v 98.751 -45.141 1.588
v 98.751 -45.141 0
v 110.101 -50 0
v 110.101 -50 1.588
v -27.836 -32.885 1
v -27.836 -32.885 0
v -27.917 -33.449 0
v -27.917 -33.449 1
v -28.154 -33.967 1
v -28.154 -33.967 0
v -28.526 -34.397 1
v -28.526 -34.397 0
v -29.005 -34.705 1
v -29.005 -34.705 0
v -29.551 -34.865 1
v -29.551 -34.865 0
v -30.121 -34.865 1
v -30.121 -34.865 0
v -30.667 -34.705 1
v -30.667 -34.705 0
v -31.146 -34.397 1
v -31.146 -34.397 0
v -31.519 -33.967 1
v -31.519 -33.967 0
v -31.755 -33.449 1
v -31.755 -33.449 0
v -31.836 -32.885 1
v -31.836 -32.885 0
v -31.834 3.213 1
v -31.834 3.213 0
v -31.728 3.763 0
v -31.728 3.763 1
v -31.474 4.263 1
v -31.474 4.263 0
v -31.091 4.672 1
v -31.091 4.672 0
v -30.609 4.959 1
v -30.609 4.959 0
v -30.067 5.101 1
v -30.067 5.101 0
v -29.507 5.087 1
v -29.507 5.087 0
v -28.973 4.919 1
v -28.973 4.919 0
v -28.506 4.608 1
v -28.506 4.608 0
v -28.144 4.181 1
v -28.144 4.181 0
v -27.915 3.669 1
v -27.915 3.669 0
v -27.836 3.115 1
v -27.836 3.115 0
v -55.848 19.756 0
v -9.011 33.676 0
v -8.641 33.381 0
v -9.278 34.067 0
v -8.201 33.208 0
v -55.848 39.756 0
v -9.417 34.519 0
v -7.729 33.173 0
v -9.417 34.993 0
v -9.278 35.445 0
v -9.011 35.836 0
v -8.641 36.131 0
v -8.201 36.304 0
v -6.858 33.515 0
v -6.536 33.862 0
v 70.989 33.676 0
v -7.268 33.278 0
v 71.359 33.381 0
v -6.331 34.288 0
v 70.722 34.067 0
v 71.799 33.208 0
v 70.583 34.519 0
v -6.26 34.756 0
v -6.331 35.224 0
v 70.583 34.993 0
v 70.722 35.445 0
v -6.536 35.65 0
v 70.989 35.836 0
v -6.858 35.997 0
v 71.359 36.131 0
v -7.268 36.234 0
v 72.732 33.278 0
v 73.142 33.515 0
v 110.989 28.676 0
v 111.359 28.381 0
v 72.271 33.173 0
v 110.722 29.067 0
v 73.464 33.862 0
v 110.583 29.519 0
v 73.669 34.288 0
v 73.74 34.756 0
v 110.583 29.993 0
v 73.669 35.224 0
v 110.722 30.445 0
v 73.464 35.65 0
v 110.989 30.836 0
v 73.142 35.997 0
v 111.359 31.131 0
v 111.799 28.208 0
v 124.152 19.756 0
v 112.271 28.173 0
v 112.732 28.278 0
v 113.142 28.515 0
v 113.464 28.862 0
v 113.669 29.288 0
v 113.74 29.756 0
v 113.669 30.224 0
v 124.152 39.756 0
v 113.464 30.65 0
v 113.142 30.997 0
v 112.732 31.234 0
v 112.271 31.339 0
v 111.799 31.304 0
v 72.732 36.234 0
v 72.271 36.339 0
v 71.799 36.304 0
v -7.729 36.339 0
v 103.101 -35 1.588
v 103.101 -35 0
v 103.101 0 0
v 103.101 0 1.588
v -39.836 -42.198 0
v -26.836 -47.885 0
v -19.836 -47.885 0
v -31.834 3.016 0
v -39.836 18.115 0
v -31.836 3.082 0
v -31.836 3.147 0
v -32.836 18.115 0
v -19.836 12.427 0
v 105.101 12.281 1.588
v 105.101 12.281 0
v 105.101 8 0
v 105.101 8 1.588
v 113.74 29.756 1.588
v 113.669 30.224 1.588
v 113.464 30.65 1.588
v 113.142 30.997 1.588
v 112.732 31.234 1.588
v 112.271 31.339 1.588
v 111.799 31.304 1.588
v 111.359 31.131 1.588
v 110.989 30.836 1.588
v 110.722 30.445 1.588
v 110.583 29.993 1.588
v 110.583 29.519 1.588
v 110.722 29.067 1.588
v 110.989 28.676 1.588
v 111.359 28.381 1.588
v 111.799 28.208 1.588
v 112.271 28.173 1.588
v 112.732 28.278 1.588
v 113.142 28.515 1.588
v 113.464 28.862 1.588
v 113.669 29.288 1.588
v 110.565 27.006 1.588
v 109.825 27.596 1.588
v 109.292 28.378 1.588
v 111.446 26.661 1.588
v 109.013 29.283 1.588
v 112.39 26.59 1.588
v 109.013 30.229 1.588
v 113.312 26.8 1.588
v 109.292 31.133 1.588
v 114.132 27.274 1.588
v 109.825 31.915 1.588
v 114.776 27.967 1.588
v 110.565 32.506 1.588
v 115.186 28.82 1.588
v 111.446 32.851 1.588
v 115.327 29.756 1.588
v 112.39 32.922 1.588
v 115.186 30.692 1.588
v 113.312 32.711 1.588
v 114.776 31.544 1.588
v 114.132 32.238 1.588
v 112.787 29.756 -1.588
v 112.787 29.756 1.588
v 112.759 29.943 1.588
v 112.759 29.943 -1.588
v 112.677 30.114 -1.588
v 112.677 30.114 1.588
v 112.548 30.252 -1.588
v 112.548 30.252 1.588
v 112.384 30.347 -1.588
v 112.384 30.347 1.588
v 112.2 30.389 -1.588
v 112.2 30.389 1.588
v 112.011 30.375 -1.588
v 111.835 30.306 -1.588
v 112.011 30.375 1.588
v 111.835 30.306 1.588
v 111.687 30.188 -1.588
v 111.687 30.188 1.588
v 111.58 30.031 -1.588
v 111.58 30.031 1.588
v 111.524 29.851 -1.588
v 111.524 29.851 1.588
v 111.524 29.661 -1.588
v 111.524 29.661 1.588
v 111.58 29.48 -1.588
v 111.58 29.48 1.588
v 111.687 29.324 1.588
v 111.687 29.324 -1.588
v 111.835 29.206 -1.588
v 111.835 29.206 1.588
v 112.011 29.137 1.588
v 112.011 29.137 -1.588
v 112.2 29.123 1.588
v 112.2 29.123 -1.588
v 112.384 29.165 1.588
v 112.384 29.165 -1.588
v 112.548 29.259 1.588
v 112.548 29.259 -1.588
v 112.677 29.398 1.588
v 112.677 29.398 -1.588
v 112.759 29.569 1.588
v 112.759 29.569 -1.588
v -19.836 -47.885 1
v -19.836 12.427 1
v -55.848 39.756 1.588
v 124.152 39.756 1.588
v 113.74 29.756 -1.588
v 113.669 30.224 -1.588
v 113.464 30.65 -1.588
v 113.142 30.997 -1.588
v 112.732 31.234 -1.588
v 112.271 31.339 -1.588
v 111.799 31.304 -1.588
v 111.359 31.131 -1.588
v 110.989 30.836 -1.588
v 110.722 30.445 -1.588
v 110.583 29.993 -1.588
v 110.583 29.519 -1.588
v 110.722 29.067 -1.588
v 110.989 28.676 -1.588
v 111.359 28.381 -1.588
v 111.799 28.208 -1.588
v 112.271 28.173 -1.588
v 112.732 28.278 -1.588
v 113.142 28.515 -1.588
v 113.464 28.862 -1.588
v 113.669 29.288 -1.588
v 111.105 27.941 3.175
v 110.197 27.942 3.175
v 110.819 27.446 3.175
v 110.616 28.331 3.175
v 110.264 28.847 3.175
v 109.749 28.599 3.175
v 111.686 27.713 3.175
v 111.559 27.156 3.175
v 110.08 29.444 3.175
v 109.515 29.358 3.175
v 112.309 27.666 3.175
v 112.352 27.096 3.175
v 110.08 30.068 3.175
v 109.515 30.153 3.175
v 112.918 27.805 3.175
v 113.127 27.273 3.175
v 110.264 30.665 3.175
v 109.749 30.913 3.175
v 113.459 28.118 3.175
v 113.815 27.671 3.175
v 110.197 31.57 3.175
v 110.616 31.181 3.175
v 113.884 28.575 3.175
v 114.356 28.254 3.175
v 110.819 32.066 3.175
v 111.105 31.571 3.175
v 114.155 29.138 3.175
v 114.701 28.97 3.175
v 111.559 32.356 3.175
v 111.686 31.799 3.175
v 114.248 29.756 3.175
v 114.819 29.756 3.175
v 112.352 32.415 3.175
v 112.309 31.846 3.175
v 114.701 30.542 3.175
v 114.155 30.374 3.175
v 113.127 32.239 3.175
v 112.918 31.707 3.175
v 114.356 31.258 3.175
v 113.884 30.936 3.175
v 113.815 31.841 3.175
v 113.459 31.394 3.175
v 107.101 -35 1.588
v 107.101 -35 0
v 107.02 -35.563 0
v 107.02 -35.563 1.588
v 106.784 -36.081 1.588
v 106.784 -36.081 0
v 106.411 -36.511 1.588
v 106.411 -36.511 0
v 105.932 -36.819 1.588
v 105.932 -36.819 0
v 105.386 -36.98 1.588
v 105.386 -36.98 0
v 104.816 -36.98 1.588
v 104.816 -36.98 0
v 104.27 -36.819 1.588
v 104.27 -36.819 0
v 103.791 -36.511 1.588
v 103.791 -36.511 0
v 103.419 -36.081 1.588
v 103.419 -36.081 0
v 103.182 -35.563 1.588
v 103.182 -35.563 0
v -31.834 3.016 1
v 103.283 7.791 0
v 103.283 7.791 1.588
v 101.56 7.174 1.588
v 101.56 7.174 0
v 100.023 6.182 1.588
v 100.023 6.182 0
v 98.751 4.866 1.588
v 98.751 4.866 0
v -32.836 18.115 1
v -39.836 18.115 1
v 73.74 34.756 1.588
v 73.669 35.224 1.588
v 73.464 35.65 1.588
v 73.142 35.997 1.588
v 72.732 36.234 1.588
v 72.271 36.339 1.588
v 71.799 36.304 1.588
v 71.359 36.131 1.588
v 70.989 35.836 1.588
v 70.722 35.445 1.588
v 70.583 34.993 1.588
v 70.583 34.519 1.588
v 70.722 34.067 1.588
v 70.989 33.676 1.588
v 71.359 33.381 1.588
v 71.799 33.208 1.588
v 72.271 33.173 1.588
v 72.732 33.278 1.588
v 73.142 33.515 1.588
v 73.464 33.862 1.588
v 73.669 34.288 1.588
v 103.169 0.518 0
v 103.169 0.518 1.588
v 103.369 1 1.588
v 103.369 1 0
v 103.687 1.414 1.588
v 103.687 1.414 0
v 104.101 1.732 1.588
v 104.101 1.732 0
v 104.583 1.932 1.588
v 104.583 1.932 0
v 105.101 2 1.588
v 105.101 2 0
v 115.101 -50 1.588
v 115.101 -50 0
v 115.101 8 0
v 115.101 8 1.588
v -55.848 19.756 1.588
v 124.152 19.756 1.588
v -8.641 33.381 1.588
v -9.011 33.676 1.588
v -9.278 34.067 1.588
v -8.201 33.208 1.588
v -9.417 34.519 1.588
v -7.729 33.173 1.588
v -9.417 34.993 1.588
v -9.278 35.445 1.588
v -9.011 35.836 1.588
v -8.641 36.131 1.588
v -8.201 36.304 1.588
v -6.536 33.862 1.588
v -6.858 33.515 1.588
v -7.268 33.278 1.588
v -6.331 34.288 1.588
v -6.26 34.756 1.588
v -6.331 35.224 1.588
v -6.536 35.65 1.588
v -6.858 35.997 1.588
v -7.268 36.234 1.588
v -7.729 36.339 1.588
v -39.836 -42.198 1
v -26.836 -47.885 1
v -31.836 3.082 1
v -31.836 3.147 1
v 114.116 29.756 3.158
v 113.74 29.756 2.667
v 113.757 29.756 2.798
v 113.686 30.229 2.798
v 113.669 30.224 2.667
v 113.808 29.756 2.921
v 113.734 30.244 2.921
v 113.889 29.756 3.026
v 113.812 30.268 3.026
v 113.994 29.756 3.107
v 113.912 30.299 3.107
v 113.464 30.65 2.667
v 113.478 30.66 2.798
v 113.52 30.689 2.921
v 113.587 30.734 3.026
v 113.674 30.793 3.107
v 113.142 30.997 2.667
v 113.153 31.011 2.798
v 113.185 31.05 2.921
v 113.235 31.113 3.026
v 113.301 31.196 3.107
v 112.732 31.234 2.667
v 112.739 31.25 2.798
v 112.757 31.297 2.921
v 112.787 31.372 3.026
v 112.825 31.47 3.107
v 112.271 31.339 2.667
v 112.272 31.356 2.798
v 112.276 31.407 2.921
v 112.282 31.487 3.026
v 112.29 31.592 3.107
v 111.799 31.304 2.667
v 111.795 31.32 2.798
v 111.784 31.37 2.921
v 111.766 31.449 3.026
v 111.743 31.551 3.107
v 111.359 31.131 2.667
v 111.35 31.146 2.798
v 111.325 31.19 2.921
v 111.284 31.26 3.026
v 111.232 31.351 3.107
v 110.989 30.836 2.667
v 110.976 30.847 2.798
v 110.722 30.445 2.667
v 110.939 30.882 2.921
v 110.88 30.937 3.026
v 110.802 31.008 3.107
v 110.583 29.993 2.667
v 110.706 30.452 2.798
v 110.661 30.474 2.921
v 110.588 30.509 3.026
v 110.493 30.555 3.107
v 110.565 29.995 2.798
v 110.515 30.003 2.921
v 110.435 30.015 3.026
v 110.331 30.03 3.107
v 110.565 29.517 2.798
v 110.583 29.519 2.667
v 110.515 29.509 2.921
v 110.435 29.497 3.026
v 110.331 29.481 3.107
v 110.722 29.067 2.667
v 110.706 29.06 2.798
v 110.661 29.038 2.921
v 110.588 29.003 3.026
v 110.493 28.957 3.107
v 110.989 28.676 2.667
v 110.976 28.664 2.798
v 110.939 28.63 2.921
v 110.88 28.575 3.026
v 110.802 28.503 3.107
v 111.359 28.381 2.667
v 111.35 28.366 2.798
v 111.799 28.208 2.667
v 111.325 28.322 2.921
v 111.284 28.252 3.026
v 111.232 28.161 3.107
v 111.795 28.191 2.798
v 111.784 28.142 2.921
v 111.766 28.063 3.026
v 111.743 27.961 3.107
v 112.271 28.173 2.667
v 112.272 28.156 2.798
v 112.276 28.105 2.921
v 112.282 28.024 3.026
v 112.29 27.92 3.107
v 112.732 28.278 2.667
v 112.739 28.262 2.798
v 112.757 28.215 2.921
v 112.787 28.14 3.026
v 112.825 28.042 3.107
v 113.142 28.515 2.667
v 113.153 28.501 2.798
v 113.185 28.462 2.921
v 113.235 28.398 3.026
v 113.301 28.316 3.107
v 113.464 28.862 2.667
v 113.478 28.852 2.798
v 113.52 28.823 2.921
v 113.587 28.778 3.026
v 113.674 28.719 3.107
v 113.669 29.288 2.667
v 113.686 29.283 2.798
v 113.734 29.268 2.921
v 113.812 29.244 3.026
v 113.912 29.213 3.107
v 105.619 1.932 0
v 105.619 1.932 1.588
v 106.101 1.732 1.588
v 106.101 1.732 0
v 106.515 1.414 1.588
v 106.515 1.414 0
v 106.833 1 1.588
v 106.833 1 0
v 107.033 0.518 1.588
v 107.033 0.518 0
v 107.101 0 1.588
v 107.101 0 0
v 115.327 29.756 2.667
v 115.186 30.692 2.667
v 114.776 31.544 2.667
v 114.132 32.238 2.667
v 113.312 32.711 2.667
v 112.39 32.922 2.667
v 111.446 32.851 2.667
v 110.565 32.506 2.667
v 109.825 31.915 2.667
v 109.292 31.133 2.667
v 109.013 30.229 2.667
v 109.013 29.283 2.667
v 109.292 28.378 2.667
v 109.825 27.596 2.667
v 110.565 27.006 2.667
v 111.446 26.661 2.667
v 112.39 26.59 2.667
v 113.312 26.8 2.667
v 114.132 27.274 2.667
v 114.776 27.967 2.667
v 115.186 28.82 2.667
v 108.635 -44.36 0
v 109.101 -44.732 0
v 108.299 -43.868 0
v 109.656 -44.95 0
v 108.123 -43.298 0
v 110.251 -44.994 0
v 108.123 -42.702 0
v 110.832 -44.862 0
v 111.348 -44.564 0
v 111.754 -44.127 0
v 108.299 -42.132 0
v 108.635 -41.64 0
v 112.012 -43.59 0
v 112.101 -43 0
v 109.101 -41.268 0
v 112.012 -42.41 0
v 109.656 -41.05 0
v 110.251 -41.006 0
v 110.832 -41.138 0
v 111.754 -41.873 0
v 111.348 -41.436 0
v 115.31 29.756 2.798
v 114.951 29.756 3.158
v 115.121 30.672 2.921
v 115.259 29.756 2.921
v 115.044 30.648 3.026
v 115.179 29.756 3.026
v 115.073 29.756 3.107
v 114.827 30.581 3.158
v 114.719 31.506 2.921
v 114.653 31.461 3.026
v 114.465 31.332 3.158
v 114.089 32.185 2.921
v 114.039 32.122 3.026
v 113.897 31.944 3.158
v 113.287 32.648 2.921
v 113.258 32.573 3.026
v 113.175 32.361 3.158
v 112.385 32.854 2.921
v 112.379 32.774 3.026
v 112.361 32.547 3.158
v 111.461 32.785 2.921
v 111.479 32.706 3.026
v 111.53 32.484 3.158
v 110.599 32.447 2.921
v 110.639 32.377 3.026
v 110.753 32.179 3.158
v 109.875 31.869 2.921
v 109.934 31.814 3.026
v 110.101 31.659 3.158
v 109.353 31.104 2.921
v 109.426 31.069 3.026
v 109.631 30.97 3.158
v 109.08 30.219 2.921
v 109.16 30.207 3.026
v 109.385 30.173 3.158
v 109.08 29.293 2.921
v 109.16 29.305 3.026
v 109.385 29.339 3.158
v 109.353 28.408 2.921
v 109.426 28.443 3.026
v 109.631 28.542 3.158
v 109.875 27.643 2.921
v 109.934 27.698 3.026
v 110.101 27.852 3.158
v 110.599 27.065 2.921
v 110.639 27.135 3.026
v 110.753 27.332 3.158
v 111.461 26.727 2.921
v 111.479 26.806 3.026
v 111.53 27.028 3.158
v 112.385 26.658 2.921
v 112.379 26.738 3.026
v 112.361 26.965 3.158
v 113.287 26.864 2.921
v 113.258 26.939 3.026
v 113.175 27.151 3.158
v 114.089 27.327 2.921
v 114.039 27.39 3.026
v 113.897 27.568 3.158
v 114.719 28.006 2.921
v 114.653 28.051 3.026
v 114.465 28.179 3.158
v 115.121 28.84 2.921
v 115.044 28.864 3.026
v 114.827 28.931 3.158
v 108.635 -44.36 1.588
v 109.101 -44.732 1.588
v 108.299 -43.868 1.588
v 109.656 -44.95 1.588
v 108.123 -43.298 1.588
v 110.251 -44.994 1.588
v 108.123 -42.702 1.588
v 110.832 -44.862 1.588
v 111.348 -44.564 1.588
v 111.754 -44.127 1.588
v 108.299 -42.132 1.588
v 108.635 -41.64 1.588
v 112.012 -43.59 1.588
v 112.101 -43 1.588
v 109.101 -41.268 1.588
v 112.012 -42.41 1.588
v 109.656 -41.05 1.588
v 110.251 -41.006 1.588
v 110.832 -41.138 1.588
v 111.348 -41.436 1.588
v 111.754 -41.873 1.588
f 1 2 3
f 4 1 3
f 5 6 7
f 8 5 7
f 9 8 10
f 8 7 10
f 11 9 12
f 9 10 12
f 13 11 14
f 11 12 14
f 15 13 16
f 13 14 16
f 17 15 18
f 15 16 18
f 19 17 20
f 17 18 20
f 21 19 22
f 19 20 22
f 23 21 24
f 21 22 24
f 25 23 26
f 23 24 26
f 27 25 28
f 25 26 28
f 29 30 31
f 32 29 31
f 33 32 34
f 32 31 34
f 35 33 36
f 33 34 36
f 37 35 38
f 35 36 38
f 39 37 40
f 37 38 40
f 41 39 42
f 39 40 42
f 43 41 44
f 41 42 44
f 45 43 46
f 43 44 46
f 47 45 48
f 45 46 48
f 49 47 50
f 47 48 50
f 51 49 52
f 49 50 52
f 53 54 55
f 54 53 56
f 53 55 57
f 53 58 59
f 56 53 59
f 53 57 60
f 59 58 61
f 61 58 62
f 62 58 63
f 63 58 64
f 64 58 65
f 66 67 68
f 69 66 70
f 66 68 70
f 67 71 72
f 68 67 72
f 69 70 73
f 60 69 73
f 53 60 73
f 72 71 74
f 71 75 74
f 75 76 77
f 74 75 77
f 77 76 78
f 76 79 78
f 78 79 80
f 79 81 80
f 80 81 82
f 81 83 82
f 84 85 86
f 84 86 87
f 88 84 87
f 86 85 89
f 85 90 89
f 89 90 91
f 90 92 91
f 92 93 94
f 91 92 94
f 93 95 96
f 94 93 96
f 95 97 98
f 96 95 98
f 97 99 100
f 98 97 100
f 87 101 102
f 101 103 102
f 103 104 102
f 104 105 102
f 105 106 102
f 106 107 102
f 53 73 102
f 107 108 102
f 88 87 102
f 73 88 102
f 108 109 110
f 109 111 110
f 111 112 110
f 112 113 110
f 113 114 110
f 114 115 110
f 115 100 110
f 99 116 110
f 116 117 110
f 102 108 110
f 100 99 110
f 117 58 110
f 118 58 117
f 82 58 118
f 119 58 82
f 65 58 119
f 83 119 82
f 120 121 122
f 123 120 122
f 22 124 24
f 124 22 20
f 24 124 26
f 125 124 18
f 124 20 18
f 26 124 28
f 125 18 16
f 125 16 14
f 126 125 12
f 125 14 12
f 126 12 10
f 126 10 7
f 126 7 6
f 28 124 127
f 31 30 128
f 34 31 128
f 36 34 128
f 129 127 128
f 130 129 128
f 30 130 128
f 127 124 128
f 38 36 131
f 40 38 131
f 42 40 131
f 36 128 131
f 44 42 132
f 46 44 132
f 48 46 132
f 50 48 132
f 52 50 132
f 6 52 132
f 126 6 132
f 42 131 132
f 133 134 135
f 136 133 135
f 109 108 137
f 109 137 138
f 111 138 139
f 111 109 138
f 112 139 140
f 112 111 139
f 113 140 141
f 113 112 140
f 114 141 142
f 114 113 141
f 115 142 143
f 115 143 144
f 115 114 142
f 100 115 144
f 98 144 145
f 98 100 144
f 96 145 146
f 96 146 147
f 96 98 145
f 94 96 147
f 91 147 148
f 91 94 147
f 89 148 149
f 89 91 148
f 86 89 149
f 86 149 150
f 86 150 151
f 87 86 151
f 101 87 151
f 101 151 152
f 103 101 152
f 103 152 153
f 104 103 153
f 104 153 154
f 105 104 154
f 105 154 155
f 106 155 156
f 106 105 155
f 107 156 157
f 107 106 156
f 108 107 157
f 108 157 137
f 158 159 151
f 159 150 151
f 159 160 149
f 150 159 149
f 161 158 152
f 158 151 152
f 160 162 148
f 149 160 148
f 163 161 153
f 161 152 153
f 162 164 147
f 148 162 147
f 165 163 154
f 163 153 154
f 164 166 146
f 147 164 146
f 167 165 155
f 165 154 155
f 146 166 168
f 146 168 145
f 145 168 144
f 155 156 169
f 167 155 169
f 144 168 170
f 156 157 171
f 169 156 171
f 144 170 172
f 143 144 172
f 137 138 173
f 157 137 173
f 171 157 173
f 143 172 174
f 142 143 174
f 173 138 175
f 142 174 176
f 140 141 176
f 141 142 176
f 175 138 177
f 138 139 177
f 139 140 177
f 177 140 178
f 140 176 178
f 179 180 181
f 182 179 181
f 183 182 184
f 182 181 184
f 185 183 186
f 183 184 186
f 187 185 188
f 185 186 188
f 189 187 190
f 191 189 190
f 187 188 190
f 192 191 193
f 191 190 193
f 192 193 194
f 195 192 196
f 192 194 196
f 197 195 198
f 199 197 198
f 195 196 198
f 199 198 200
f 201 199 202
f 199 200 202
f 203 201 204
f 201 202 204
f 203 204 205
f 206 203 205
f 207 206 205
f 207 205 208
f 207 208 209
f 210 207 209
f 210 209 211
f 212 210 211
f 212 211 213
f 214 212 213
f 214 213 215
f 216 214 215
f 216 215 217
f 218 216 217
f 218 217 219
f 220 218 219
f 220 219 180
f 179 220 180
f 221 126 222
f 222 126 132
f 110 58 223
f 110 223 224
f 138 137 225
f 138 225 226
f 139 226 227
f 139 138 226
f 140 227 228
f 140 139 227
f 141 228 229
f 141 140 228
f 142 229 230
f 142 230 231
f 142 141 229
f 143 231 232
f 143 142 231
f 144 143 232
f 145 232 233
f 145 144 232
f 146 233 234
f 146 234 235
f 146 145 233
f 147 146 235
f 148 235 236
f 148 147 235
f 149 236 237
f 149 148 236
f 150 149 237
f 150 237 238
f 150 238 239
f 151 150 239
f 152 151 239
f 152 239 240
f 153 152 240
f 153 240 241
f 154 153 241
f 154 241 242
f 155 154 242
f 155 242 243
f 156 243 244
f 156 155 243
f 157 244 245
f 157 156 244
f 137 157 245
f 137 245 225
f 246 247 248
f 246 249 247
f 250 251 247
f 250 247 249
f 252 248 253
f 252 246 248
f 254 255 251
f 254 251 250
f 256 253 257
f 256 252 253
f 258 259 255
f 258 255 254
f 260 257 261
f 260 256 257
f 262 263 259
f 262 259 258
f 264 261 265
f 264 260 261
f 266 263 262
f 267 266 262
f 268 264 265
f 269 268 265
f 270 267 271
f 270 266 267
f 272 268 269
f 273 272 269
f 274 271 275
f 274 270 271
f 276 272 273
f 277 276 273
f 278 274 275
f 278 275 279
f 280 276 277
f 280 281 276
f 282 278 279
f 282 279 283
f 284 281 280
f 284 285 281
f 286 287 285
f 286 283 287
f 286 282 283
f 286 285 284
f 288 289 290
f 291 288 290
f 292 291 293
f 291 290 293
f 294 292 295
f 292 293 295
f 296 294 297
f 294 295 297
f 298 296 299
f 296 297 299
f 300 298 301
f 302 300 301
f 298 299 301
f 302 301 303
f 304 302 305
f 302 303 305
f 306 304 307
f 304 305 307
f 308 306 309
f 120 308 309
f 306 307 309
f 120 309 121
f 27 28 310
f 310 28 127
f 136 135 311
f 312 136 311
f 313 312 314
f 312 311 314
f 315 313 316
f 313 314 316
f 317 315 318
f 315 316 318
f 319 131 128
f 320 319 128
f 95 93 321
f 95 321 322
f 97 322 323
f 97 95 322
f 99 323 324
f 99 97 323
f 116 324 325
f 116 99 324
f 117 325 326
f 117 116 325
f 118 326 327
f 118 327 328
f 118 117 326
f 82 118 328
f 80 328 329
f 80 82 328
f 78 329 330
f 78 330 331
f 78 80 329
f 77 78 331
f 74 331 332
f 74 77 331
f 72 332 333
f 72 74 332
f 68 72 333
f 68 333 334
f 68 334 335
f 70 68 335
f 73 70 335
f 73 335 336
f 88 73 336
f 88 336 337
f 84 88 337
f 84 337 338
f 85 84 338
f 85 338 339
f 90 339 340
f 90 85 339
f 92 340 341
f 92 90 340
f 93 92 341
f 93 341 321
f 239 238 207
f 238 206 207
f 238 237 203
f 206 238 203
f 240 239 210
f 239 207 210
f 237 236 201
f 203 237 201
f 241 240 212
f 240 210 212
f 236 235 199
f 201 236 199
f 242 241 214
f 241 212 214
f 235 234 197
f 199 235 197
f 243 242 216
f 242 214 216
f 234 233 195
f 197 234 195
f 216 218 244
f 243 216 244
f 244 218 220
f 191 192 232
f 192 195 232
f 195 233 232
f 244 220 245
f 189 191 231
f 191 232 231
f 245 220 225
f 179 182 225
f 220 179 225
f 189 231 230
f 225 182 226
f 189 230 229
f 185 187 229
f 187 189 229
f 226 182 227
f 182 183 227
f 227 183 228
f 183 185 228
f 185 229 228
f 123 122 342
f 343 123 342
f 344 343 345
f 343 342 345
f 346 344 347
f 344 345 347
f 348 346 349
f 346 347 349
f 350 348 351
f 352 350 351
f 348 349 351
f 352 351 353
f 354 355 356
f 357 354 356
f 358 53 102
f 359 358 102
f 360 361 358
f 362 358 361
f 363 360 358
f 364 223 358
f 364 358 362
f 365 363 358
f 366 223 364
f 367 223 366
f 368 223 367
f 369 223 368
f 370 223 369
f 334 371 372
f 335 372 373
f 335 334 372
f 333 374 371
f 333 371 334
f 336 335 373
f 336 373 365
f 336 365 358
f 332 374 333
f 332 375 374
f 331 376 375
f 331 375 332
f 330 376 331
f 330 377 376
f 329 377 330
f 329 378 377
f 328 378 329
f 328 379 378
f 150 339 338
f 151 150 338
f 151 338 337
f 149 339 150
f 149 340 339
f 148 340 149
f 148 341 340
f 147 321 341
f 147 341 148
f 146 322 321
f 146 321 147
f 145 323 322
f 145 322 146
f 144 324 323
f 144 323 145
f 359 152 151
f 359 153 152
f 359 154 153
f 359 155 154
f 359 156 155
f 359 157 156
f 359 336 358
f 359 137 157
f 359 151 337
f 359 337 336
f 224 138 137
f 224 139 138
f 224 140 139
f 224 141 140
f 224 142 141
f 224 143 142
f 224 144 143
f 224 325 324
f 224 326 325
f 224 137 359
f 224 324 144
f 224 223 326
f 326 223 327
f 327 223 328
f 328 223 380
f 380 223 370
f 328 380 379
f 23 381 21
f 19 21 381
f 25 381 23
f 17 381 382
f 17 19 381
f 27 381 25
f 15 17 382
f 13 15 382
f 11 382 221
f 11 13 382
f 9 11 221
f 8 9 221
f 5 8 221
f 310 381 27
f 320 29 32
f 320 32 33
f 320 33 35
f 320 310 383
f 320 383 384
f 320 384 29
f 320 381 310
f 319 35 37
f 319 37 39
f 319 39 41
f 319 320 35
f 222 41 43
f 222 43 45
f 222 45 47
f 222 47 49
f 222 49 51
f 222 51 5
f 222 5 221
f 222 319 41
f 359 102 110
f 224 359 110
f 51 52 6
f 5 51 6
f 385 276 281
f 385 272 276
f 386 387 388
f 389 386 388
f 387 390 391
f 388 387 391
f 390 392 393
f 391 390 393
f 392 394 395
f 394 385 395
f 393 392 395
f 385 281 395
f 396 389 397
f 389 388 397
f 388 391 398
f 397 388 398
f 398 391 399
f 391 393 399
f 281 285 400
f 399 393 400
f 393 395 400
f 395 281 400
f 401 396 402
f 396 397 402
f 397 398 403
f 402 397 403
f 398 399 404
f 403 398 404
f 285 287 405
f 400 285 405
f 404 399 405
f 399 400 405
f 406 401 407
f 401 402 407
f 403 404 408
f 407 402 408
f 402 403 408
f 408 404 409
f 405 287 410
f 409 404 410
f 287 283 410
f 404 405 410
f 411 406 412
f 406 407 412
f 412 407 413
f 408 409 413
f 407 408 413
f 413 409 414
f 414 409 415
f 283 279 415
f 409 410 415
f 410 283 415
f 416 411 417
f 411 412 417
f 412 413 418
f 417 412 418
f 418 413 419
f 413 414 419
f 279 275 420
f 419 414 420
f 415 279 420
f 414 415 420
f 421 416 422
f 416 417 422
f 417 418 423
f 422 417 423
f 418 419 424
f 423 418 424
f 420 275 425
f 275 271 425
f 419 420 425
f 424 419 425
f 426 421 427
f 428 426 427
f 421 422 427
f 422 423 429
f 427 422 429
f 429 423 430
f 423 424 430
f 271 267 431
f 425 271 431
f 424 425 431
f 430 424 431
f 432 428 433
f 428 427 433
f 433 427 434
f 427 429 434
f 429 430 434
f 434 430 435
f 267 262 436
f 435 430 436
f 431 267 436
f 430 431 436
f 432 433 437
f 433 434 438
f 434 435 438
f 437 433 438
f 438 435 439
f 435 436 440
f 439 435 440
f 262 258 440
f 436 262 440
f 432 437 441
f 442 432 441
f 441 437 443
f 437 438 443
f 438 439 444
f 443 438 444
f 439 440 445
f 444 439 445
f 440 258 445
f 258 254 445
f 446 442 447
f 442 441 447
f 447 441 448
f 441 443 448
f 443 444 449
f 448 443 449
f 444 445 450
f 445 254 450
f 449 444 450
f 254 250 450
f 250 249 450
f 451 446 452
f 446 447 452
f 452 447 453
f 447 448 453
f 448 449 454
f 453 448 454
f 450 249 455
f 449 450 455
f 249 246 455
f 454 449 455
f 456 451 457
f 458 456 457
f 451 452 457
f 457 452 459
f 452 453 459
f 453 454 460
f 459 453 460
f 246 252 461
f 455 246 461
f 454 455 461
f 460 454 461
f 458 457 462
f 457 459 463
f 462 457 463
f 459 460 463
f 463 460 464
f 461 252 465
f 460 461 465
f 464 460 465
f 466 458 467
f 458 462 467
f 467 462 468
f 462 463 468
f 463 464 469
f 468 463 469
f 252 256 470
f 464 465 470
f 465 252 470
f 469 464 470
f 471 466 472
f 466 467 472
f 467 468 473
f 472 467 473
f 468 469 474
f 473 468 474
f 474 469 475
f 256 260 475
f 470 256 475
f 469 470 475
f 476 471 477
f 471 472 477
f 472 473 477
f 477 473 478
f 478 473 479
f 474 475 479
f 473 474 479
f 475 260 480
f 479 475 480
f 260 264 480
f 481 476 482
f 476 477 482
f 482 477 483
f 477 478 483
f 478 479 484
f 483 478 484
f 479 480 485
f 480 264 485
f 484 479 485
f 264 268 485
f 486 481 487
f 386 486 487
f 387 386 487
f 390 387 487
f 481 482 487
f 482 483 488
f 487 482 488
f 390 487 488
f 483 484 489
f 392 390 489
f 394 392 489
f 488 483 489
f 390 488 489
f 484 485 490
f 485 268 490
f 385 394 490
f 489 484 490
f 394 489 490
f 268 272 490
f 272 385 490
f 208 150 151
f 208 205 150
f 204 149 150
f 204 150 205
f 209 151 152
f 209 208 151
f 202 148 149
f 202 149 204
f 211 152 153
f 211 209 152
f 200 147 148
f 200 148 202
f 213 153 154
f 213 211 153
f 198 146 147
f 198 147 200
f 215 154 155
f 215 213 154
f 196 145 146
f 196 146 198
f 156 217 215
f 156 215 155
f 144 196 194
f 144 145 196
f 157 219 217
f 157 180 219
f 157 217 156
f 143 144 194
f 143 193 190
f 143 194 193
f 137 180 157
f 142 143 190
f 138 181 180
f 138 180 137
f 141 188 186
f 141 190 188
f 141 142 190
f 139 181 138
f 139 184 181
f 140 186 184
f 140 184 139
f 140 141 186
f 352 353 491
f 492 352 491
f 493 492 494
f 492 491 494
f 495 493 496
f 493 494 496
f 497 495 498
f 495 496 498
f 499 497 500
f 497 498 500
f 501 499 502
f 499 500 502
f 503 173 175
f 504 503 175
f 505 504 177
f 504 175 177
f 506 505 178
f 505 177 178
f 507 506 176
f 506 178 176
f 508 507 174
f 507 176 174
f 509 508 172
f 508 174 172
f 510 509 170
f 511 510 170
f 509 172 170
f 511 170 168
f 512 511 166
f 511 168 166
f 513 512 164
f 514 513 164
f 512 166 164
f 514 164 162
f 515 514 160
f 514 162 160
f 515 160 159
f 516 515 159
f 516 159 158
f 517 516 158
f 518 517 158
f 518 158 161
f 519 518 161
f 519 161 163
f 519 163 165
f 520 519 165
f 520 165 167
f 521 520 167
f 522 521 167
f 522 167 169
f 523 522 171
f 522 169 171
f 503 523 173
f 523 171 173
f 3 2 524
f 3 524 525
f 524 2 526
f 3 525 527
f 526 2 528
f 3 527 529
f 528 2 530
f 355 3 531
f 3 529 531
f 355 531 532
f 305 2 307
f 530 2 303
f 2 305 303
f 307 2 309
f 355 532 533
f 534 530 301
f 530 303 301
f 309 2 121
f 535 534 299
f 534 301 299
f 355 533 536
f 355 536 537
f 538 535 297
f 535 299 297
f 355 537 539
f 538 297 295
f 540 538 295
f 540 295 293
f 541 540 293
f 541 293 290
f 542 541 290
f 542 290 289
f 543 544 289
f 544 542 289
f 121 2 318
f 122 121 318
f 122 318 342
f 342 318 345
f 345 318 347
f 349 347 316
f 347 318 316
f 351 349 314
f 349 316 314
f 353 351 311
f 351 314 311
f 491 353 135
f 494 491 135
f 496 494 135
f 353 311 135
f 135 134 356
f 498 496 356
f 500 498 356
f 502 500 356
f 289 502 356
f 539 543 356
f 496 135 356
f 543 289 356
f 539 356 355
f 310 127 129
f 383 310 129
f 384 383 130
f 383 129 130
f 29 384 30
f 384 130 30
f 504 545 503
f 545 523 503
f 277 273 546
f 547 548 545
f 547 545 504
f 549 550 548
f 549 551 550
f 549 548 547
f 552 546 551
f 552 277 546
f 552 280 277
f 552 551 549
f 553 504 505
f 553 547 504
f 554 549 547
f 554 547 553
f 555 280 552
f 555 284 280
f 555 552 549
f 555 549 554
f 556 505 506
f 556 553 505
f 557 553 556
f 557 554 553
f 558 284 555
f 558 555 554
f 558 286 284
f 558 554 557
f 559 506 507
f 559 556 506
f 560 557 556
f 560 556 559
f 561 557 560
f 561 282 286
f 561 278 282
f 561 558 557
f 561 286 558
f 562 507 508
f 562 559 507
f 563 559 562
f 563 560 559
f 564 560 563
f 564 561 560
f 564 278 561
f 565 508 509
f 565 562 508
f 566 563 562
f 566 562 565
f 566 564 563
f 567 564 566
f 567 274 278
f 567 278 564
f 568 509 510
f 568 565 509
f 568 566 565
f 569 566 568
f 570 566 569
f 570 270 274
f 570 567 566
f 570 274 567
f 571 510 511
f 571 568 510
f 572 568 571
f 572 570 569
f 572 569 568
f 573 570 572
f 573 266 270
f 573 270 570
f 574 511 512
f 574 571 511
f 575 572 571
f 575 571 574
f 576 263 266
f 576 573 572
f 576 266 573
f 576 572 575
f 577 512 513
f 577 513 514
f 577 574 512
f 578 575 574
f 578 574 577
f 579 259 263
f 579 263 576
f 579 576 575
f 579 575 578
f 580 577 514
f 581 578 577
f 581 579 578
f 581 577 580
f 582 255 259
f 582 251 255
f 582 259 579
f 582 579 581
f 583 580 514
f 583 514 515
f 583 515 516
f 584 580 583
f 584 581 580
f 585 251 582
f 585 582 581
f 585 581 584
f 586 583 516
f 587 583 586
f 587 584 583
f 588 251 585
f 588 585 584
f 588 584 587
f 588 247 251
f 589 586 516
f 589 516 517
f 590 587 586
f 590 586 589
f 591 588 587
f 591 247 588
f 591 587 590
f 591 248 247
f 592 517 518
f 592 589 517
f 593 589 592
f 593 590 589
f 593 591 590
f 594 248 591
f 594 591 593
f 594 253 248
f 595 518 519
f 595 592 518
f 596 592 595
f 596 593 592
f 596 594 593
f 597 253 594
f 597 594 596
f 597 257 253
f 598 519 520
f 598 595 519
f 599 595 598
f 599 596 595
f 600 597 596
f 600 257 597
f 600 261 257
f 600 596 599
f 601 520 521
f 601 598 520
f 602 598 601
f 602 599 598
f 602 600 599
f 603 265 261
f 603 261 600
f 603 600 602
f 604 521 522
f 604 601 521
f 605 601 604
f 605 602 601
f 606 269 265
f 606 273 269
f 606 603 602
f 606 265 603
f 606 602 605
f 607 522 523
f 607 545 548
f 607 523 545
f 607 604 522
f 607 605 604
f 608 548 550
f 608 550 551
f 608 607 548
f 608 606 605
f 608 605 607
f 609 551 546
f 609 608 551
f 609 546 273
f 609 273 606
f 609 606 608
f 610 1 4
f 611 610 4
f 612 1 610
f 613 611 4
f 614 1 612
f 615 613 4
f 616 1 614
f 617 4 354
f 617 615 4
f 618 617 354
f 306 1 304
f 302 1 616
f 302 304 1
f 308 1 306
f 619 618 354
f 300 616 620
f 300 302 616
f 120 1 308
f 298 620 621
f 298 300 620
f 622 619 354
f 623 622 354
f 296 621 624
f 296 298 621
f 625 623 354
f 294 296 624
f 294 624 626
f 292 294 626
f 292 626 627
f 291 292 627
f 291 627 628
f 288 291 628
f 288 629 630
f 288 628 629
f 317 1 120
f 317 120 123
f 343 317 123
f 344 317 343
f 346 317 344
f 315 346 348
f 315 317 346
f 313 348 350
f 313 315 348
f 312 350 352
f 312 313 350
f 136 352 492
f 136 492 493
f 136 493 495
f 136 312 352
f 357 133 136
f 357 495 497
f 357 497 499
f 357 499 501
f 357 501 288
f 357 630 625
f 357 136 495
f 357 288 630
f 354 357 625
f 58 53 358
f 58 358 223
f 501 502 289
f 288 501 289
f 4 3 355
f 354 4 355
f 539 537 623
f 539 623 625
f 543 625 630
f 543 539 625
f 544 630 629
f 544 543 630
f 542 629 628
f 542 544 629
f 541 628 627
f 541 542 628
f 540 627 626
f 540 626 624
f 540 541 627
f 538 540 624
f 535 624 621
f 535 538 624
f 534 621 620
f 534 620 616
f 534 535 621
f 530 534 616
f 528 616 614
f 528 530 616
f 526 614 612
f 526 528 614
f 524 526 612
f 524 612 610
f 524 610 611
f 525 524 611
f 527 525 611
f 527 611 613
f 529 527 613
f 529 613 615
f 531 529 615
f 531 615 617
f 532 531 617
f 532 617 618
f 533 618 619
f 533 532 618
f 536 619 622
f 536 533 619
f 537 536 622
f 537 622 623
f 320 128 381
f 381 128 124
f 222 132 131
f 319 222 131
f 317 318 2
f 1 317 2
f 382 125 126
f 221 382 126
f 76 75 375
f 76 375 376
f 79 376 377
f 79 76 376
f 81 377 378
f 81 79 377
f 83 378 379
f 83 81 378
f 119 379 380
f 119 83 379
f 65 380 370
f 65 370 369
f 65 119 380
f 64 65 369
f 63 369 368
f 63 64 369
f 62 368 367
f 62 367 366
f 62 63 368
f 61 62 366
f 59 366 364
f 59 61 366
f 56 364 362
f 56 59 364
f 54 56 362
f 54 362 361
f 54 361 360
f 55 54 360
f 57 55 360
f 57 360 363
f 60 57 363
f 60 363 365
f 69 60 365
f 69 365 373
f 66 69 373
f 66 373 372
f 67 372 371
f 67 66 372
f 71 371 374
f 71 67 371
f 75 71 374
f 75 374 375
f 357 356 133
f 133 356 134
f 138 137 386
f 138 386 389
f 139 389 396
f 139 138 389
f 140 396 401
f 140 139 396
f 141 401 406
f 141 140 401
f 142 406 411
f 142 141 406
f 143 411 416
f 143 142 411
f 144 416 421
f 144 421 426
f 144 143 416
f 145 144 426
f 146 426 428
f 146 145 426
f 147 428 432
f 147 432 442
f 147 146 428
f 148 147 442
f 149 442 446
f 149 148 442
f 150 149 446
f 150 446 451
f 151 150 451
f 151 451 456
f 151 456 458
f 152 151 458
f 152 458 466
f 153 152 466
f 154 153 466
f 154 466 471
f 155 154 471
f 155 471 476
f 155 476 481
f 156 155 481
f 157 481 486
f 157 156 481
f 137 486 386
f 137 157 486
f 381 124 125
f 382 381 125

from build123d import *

# Parameters (mm, degrees)
F0_W      = 180
F0_H      = 20
F0_R      = 1.5875
F1_DEPTH  = 1.5875
F2_R      = 2
F3_DEPTH  = 1.5875
F4_R      = 1.5875
F5_DEPTH  = 3.175
F6_R      = 3.175
F6_R_2    = 1.5875
F7_DEPTH  = 1.5875
F6_R_3    = 0.635
F8_DEPTH  = 3.176
F9_R      = 0.508
F10_DEPTH = 1


# Not quite as in the source:
# - a feature names something its author has since deleted; it is built from what else it names


with BuildPart() as f1:
    # F0 (on Top) → F1 (new body)
    with BuildSketch(Plane.XY):
        with Locations((34.1523514688, 29.7559105814)):
            Rectangle(F0_W, F0_H)
        with Locations((112.1523514688, 29.7559105814)):
            Circle(F0_R, mode=Mode.SUBTRACT)
        with Locations((-7.8476485312, 34.7559105814)):
            Circle(F0_R, mode=Mode.SUBTRACT)
        with Locations((72.1523514688, 34.7559105814)):
            Circle(F0_R, mode=Mode.SUBTRACT)
    extrude(amount=F1_DEPTH)


with BuildPart() as f3:
    # F2 (on Top) → F3 (new body)
    with BuildSketch(Plane.XY):
        Polygon((105.1010932944, 12.2813455657), (105.1010932944, 8), (115.1010932944, 8), align=None)
        with BuildLine():
            Line((115.1010932944, 8), (105.1010932944, 8))
            ThreePointArc((105.1010932944, 8), (110.7579475439, 5.6568542495), (113.1010932944, 0))
            ThreePointArc((113.1010932944, 0), (111.4256486147, -4.8989794856), (107.1010932944, -7.7459666924))
            Line((107.1010932944, -7.7459666924), (107.1010932944, -35))
            ThreePointArc((107.1010932944, -35), (105.1010932944, -37), (103.1010932944, -35))
            Line((103.1010932944, -35), (103.1010932944, -7.7459666924))
            ThreePointArc((103.1010932944, -7.7459666924), (100.6847322913, -6.670513885), (98.7510932944, -4.865953144))
            Line((98.7510932944, -4.865953144), (98.7510932944, -43))
            Line((98.7510932944, -43), (110.1010932944, -47.8593272171))
            Line((110.1010932944, -47.8593272171), (115.1010932944, -50))
            Line((115.1010932944, -50), (115.1010932944, 8))
        make_face()
        with Locations((110.1010932944, -43)):
            Circle(F2_R, mode=Mode.SUBTRACT)
        with BuildLine():
            ThreePointArc((113.1010932944, 0), (110.7579475439, 5.6568542495), (105.1010932944, 8))
            ThreePointArc((105.1010932944, 8), (101.5604454124, 7.1738283069), (98.7510932944, 4.865953144))
            Line((98.7510932944, 4.865953144), (98.7510932944, -4.865953144))
            ThreePointArc((98.7510932944, -4.865953144), (100.6847322913, -6.670513885), (103.1010932944, -7.7459666924))
            Line((103.1010932944, -7.7459666924), (103.1010932944, 0))
            ThreePointArc((103.1010932944, 0), (103.686879732, 1.4142135624), (105.1010932944, 2))
            ThreePointArc((105.1010932944, 2), (106.5153068568, 1.4142135624), (107.1010932944, 0))
            Line((107.1010932944, 0), (107.1010932944, -7.7459666924))
            ThreePointArc((107.1010932944, -7.7459666924), (111.4256486147, -4.8989794856), (113.1010932944, 0))
        make_face()
        Polygon((110.1010932944, -50), (115.1010932944, -50), (110.1010932944, -47.8593272171), align=None)
        Polygon((110.1010932944, -47.8593272171), (98.7510932944, -43), (98.7510932944, -45.1406727829), (110.1010932944, -50), align=None)
    extrude(amount=F3_DEPTH)


with BuildPart() as f5:
    # F4 (on face) → F5 (new body)
    with BuildSketch(Plane.XY.offset(1.5875)):
        with Locations((112.1523514688, 29.7559105814)):
            Circle(F4_R)
    extrude(amount=-F5_DEPTH)

    # F6 (on face) → F8 (cut, through all)
    with BuildSketch(Plane.XY.offset(1.5875)):
        with Locations((112.1523514688, 29.7559105814)):
            Circle(F6_R_3)
    extrude(amount=-F8_DEPTH, mode=Mode.SUBTRACT)


with BuildPart() as f7:
    # F6 (on face) → F7 (new body)
    with BuildSketch(Plane.XY.offset(1.5875)):
        with Locations((112.1523514688, 29.7559105814)):
            Circle(F6_R)
        with Locations((112.1523514688, 29.7559105814)):
            Circle(F6_R_2, mode=Mode.SUBTRACT)
    extrude(amount=F7_DEPTH)

    # F9
    f9_edges = [f7.edges().sort_by_distance(p)[0] for p in [
        (110.564851, 29.755911, 3.175),
        (108.977351, 29.755911, 3.175),
    ]]
    fillet(f9_edges, radius=F9_R)


with BuildPart() as f10:
    # F2 (on Top) → F10 (new body)
    with BuildSketch(Plane.XY):
        Polygon((-26.8360394478, -47.8854802153), (-19.8360394478, -47.8854802153), (-19.8360394478, 12.4270197847), (-32.8360394478, 18.1145197847), (-39.8360394478, 18.1145197847), (-39.8360394478, -42.1979802153), align=None)
        with BuildLine():
            Line((-27.8360394478, 3.1145197847), (-27.8360394478, -32.8854802153))
            ThreePointArc((-27.8360394478, -32.8854802153), (-29.8361067273, -34.8854802142), (-31.8360394433, -32.8853456563))
            Line((-31.8360394433, -32.8853456563), (-31.8336240012, 3.0162550804))
            ThreePointArc((-31.8336240012, 3.0162550804), (-31.8360394433, 3.1146543437), (-31.8336107607, 3.2130532811))
            ThreePointArc((-31.8336107607, 3.2130532811), (-29.7867577361, 5.1139125207), (-27.8360394478, 3.1145197847))
        make_face(mode=Mode.SUBTRACT)
    extrude(amount=F10_DEPTH)


solid = Compound([f1.part, f3.part, f5.part, f7.part, f10.part])
